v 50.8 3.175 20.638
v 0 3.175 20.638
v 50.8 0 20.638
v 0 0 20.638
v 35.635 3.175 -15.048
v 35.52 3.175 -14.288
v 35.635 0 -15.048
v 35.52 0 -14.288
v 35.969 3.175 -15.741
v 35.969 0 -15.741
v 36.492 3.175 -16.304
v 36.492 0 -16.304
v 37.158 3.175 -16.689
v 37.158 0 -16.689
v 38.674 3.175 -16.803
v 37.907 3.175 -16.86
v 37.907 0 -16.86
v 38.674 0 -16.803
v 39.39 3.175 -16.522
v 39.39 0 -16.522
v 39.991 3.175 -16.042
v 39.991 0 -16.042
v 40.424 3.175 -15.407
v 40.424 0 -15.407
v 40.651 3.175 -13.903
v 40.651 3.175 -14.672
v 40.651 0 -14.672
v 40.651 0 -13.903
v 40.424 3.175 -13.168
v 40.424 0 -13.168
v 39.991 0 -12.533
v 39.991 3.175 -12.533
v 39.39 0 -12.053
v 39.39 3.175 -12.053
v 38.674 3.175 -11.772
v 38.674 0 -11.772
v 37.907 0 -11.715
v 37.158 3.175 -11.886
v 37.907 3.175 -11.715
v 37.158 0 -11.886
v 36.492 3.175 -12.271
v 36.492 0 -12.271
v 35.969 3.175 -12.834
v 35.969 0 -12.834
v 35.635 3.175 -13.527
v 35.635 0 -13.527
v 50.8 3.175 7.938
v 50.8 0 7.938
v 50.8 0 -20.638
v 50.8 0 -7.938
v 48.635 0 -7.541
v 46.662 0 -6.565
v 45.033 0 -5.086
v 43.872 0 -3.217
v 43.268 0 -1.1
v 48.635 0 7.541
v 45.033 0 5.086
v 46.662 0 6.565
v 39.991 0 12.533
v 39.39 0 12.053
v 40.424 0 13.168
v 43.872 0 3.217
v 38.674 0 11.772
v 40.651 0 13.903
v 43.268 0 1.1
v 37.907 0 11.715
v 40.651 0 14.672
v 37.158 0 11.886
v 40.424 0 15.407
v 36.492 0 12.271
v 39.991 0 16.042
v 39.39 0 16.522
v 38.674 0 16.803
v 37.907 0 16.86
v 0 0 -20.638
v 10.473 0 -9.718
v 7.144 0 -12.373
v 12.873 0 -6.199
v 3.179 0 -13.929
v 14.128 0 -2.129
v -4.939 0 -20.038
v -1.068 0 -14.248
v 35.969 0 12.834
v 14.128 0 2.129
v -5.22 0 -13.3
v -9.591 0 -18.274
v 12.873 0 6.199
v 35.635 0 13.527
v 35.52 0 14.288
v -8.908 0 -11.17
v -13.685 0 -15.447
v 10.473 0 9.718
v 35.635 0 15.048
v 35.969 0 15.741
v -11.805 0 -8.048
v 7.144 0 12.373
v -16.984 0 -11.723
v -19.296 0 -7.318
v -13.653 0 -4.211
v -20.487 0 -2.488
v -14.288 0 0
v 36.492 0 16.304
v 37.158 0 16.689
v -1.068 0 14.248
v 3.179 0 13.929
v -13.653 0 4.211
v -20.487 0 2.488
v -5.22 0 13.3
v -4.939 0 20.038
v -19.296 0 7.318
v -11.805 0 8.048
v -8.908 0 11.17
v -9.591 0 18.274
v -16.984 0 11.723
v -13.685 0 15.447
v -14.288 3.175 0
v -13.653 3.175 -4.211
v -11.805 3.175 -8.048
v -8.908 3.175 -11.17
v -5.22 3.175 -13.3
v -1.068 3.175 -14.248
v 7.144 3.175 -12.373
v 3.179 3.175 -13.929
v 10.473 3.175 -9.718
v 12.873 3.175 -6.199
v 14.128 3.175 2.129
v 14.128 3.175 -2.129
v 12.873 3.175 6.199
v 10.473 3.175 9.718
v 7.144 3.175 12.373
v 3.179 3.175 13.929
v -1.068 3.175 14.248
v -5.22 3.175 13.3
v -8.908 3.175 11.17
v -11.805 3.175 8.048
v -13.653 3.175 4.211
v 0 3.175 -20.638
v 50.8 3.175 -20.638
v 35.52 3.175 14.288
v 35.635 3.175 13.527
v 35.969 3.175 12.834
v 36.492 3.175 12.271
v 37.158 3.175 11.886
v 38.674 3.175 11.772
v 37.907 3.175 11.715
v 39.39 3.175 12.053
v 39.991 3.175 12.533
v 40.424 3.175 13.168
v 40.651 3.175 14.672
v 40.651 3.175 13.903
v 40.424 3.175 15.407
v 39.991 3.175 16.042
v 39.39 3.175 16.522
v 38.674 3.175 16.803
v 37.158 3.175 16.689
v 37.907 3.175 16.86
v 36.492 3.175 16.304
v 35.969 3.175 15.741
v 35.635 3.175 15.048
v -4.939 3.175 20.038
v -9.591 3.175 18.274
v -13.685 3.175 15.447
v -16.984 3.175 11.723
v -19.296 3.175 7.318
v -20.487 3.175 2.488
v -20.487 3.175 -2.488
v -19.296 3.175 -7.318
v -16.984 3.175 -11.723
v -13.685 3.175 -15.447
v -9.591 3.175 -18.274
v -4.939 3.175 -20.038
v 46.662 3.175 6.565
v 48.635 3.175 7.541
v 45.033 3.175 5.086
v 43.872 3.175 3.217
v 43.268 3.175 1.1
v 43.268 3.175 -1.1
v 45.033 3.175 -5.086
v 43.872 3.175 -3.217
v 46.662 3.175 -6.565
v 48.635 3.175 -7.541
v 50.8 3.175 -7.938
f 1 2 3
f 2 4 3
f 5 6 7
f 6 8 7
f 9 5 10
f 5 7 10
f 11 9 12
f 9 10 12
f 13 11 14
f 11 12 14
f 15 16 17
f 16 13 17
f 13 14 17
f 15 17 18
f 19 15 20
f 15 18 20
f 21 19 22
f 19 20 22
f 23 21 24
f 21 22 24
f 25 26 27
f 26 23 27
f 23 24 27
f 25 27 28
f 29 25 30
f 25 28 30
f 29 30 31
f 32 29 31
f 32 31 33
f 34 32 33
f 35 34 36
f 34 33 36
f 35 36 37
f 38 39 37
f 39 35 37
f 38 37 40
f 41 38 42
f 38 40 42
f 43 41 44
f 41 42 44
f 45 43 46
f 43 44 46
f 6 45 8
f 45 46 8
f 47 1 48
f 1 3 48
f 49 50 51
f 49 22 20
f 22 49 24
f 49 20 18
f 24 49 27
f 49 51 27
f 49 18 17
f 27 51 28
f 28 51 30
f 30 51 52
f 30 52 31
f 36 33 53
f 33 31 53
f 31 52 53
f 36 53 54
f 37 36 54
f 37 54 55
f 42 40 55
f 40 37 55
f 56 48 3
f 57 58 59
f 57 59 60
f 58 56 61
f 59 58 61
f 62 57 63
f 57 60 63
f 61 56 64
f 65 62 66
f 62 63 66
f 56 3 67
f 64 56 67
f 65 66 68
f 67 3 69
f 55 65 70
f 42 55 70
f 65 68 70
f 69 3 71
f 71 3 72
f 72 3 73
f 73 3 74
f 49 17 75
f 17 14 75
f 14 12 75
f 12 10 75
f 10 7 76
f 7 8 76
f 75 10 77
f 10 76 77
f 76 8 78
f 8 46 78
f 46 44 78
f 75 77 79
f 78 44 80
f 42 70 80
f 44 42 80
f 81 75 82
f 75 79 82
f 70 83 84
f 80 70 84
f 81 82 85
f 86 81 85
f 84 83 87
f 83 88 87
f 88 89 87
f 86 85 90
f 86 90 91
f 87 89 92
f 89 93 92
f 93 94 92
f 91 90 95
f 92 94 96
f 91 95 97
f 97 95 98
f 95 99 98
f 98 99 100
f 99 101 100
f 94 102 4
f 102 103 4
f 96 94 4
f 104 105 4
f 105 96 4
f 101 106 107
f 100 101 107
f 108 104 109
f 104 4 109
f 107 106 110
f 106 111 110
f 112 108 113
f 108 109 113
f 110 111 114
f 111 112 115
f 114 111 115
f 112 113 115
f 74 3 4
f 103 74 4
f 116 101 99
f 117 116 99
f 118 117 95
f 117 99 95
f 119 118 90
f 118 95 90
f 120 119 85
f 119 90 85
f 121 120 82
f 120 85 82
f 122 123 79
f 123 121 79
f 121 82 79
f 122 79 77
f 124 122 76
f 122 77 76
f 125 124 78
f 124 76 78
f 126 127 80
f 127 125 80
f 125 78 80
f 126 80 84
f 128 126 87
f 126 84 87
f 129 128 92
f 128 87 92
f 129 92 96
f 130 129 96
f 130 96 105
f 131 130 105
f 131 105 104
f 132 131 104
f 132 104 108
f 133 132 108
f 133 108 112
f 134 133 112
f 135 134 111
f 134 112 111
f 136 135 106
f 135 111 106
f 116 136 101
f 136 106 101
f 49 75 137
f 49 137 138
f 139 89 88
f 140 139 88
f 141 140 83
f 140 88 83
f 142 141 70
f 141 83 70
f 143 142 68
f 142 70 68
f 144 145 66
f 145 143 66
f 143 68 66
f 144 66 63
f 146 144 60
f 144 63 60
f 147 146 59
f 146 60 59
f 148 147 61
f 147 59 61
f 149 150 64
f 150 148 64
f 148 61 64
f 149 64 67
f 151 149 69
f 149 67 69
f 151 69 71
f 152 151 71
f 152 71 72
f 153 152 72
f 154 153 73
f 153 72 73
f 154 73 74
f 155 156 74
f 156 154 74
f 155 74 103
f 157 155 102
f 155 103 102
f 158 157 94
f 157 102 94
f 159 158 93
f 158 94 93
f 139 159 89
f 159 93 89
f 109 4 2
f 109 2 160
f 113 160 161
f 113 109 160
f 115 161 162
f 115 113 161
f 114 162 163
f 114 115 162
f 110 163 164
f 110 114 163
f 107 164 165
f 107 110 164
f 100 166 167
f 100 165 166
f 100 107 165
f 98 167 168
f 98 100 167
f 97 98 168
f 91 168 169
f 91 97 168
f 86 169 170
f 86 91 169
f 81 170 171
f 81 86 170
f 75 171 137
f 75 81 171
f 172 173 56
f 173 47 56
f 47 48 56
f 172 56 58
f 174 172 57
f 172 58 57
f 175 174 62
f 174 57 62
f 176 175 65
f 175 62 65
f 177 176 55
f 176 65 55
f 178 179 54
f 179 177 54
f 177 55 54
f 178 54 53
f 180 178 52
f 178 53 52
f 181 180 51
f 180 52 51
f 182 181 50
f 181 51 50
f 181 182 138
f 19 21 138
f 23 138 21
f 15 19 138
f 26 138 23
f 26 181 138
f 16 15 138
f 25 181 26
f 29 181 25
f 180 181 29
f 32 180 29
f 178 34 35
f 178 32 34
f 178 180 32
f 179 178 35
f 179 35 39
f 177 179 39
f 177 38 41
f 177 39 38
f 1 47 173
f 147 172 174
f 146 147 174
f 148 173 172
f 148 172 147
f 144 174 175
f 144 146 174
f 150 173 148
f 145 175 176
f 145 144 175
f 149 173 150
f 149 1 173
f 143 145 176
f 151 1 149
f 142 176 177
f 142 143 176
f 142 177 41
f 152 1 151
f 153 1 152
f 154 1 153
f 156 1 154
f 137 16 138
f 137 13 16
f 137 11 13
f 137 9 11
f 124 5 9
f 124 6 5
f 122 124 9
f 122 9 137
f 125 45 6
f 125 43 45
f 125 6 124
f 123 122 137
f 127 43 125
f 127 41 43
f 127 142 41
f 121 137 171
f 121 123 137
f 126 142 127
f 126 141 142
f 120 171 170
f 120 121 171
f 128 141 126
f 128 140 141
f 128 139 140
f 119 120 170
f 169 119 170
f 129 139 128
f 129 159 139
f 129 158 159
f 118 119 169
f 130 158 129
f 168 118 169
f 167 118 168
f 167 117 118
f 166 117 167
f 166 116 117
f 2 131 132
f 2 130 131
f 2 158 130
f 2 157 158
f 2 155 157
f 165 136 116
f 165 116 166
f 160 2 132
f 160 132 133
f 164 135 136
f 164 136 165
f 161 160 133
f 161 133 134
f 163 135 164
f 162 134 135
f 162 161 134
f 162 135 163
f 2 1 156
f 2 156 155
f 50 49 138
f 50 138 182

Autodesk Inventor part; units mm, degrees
ref_plane "YZ Plane" through (0, 0, 0) normal (1, 0, 0) x (0, 1, 0)
ref_plane "XZ Plane" through (0, 0, 0) normal (0, 1, 0) x (-1, 0, 0)
ref_plane "XY Plane" through (0, 0, 0) normal (0, 0, 1) x (1, 0, 0)
sketch "Sketch1" plane through (0, 0, 0) normal (0, 1, 0) x (-1, 0, 0)
  circle A0 centre (0, 0) radius 14.2875
  arc A1 (0, -20.6375) -> (0, 20.6375) centre (0, 0) ccw
  line L0 (0, 20.6375) -> (-50.8, 20.6375)
  line L1 (0, -20.6375) -> (-50.8, -20.6375)
  line L2 (-50.8, -20.6375) -> (-50.8, -7.9375)
  line L3 (-50.8, 20.6375) -> (-50.8, 7.9375)
  arc A2 (-50.8, -7.9375) -> (-50.8, 7.9375) centre (-51.136, 0) ccw
  line L4 (-50.8, 14.2875) -> (-38.1, 14.2875) construction
  line L5 (-50.8, -14.2875) -> (-38.1, -14.2875) construction
  circle A3 centre (-38.1, -14.2875) radius 2.5797
  circle A4 centre (-38.1, 14.2875) radius 2.5797
  dimension "d0" = 28.575
  dimension "d1" = 6.35
  dimension "d2" = 50.8
  dimension "d3" = 50.8
  dimension "d4" = 12.7
  dimension "d5" = 12.7
  dimension "d6" = 12.7
  dimension "d7" = 5.1594
  dimension "d8" = 5.1594
extrude "Extrusion1" add sketch "Sketch1" along normal blind 3.175
properties part number "motor connector"
